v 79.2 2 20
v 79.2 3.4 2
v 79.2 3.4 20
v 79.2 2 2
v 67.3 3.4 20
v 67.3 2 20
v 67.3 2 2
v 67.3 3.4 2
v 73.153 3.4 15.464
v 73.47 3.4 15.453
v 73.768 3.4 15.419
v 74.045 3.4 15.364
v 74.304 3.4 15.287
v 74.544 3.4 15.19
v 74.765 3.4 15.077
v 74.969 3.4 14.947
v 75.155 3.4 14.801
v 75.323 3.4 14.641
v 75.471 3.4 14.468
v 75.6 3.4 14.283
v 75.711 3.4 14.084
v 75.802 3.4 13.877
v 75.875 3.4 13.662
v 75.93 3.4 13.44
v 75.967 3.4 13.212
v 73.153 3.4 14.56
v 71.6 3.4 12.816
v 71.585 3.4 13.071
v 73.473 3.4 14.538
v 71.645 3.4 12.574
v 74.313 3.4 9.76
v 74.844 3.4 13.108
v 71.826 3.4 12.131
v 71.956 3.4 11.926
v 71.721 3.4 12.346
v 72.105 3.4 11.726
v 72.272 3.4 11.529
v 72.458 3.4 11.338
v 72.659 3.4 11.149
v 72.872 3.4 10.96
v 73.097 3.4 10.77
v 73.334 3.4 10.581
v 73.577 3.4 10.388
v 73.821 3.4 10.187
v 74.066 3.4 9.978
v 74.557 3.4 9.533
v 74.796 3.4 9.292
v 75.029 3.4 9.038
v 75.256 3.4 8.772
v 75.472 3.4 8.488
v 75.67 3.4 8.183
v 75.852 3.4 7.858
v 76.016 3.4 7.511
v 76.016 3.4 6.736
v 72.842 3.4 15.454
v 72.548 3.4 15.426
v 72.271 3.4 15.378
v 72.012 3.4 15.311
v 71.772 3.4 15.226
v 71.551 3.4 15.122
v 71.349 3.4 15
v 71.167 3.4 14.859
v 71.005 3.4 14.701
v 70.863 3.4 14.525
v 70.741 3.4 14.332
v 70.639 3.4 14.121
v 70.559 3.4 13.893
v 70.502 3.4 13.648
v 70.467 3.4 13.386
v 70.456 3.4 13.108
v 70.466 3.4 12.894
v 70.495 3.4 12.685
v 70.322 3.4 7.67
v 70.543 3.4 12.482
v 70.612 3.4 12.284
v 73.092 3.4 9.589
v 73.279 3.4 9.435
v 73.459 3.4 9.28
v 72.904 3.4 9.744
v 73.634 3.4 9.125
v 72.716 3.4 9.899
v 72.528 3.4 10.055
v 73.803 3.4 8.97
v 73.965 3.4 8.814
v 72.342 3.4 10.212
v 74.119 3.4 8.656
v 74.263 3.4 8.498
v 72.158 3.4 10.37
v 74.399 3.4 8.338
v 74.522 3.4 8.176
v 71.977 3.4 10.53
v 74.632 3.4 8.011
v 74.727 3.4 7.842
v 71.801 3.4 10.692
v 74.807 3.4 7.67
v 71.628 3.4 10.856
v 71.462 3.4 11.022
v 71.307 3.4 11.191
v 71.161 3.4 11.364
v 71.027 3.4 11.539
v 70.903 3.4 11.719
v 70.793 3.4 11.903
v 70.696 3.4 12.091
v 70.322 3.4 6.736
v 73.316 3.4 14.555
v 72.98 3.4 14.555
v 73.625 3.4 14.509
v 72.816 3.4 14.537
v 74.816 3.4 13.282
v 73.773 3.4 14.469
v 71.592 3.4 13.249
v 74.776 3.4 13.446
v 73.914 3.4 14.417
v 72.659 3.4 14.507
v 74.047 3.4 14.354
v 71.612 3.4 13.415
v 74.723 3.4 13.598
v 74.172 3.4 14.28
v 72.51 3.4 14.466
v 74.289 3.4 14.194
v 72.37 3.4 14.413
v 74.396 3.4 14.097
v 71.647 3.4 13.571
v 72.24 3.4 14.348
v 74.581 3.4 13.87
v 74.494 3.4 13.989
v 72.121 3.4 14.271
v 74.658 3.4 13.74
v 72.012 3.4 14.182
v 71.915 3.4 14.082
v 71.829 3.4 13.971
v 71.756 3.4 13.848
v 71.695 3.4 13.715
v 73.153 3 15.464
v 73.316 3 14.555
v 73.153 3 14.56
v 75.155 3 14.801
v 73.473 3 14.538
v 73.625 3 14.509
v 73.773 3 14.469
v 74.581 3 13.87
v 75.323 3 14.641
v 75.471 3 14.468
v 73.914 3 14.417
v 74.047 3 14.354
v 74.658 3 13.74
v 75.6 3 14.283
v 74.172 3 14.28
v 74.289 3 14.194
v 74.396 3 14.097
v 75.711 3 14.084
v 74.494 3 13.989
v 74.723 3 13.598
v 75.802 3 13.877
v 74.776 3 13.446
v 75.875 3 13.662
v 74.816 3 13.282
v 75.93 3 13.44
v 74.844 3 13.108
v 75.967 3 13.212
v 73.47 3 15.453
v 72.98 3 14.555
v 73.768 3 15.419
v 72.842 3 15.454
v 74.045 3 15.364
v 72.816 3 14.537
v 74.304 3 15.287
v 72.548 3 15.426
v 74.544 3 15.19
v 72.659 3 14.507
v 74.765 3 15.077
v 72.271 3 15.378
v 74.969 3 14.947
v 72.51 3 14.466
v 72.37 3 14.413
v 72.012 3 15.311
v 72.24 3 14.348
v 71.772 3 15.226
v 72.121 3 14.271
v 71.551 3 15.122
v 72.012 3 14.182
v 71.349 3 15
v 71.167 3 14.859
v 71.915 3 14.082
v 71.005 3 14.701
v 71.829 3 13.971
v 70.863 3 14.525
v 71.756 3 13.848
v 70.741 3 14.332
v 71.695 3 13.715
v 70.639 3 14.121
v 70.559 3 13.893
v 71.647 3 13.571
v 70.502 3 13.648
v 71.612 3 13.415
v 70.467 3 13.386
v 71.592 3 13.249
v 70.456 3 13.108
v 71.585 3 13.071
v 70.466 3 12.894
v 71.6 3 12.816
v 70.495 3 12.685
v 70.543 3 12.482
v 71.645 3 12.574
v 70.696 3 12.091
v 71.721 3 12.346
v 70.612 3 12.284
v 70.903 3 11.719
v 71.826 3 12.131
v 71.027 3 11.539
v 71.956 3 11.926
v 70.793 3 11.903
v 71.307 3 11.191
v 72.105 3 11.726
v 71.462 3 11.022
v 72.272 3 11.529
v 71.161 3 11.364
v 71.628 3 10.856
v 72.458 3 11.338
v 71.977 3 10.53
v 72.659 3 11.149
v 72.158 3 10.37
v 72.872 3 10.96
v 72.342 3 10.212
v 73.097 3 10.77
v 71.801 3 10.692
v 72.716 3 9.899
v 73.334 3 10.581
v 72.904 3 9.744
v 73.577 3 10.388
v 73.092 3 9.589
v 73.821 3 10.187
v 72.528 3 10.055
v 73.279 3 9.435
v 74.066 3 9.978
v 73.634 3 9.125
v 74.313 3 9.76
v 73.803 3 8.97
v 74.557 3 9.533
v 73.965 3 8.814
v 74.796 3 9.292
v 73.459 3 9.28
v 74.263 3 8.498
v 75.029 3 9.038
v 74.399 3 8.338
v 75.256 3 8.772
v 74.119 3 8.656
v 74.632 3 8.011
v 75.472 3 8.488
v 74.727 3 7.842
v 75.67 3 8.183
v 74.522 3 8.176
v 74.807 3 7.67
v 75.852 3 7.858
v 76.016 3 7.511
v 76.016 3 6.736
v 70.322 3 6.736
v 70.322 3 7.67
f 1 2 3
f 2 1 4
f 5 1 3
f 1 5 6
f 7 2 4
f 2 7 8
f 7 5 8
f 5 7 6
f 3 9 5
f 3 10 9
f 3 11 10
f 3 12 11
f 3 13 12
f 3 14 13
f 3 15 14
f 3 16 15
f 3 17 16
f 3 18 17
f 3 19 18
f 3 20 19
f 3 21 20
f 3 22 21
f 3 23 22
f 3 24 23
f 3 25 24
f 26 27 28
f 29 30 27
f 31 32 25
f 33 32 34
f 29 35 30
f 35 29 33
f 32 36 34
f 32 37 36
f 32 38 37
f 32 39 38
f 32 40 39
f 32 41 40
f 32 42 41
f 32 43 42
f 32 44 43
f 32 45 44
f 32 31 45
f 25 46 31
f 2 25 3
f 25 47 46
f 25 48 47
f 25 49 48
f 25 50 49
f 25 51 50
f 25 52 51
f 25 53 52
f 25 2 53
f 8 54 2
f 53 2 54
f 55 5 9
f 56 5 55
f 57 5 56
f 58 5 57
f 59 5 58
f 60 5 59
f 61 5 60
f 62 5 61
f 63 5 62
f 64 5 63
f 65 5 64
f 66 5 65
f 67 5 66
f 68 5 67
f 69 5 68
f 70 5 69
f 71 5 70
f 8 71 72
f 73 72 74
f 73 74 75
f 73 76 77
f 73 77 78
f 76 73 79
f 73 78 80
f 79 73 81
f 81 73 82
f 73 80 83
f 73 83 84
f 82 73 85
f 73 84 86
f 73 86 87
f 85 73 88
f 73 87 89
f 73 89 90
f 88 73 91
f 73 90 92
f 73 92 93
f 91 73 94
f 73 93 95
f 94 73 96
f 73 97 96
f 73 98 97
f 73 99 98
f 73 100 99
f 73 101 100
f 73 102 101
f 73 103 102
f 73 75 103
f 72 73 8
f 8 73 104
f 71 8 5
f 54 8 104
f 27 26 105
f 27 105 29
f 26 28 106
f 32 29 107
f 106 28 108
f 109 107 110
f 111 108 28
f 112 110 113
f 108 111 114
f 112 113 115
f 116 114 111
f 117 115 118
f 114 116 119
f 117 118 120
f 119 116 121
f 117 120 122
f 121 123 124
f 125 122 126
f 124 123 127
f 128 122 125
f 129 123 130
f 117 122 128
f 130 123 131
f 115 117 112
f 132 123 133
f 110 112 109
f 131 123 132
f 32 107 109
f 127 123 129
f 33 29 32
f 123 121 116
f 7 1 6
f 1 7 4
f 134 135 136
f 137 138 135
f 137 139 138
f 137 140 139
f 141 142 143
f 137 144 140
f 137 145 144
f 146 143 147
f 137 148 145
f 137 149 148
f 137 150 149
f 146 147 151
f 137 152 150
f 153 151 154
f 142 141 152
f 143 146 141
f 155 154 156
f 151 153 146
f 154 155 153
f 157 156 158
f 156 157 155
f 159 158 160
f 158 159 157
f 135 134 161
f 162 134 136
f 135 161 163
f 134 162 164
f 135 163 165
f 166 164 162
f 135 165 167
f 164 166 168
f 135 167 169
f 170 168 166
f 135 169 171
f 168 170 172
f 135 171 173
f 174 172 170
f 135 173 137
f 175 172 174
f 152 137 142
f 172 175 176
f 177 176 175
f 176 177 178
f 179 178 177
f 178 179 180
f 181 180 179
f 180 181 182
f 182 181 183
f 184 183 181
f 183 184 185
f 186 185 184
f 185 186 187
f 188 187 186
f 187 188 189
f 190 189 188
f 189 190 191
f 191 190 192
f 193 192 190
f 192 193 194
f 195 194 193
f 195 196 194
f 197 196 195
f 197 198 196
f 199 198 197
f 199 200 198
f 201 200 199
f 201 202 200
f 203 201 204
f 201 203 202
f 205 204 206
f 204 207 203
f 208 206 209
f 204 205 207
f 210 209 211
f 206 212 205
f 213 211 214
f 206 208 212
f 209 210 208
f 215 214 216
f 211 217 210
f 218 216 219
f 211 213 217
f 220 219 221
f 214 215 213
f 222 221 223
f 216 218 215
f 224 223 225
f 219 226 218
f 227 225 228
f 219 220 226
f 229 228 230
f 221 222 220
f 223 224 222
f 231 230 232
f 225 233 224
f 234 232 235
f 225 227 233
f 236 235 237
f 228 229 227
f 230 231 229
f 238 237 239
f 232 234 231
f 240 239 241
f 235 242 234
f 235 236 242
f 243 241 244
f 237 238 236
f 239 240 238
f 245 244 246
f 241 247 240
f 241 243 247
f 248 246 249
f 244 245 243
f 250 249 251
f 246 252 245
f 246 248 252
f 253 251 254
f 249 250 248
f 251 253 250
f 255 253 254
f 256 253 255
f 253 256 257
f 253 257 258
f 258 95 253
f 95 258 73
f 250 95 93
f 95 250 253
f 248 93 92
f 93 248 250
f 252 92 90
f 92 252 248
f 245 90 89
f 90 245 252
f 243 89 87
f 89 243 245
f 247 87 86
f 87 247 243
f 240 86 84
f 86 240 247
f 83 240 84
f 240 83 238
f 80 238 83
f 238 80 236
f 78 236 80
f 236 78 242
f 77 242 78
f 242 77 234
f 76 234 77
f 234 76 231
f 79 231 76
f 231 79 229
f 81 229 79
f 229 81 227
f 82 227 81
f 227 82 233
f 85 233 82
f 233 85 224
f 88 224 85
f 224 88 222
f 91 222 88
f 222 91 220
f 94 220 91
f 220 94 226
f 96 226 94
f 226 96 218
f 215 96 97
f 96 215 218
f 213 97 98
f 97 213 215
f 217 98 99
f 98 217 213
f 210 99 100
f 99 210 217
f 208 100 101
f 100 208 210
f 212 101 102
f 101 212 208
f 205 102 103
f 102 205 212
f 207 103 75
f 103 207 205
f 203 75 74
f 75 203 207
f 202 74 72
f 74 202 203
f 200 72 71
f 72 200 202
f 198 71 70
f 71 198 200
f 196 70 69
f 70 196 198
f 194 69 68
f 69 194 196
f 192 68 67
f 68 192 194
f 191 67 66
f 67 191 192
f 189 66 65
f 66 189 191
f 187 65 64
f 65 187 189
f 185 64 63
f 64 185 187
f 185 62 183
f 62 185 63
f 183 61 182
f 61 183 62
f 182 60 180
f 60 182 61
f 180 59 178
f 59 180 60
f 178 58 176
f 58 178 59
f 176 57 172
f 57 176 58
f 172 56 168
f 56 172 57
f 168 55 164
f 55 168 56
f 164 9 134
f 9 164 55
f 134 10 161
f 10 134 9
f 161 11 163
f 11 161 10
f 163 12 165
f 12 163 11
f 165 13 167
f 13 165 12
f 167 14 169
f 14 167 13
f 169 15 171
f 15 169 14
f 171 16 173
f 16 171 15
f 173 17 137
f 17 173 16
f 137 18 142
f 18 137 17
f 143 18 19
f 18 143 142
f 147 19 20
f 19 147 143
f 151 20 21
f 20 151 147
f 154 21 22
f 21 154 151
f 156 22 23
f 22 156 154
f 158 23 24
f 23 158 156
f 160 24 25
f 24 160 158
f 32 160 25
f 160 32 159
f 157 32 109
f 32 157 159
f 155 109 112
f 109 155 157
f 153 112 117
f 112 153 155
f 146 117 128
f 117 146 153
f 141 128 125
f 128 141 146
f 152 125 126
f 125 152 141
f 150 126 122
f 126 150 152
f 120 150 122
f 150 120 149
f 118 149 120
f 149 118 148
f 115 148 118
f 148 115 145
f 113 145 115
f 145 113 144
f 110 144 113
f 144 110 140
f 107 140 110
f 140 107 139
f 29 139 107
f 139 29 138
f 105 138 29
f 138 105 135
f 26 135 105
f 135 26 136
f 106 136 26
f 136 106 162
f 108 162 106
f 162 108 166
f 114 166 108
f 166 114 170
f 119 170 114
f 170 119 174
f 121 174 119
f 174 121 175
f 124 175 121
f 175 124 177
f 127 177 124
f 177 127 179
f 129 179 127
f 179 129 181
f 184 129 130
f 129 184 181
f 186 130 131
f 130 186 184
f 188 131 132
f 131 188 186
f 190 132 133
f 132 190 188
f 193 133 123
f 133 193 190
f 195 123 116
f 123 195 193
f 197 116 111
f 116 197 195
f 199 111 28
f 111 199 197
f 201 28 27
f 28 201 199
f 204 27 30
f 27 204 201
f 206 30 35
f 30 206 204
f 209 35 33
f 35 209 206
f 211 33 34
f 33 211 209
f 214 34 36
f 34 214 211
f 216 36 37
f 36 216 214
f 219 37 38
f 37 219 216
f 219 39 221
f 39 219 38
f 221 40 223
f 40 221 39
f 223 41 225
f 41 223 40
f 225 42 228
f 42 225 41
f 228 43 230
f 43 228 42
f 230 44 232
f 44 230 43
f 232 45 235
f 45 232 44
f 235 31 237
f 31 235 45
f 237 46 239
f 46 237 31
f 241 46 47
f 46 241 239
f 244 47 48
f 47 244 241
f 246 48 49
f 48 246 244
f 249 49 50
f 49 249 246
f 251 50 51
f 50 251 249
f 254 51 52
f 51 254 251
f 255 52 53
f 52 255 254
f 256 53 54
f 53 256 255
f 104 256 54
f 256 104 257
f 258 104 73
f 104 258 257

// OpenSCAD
// file: params.scad
// spellchecker:ignore centreline counterbore datasheet elec usbc waveshare
// --- Display ---
// Waveshare 7.5inch e-Paper V2 (800×480). Datasheet:
// https://www.waveshare.com/w/upload/6/60/7.5inch_e-Paper_V2_Specification.pdf
display_w        = 111.2;  // display panel width  (mm) — portrait
display_h        = 170.2;  // display panel height (mm) — portrait
disp_thickness   =   1.25; // display panel thickness (mm) — datasheet 1.18; 1.25 gives 0.07mm extra shelf clearance
screen_area_w    =  97.92; // active screen width  (mm)
screen_area_h    = 163.2;  // active screen height (mm)
display_border_wide  =  9.78; // wide border (long edge, right side; = display_w − display_border_narrow − screen_area_w)
display_border_narrow=  3.5;  // narrow border (long edge, left/top/bottom = 1.2+1.5+0.8mm from datasheet)
display_border_short =  3.5;  // short-edge border (top and bottom)
disp_shift           =  0.6;  // additional downward Y offset on display; creates 1mm stopper lip on upper L-blocks

// --- Cavities (back shell interior) ---
elec_w         =  65;    // Pi Zero width  (mm)
elec_l         =  30;    // Pi Zero length (mm)
elec_depth     =  16;    // Pi Zero + PiSugar stack depth (mm) — 15.7mm actual
hat_w          =  30;    // Waveshare HAT width  (mm) — rotated 90° in case
hat_l          =  66;    // Waveshare HAT length (mm)
hat_depth      =   9.5;  // Waveshare HAT depth  (mm)
bat_w          =  28;    // battery width  (mm) — portrait: 28×59 footprint
bat_l          =  59;    // battery length (mm)
bat_depth      =  12.5;  // battery depth  (mm) — 10.7 body + 1.8 magnet

// --- Primitives first (no dependencies) ---
case_w         = 135;    // width  (mm) — 135mm clears 4mm nut towers with 1.5mm margin right of display
case_h         = 210;    // height (mm) — 2+170+35+2=209 → 210
front_depth    =   2;    // front bezel thickness (mm)
back_depth     =  20;    // back shell depth (mm) — elec_depth 15.7 + 2 wall + 2.3 clearance; unconfirmed
fillet_r       =   2;    // outer-edge fillet radius (mm)
edge_overhang_angle = 55; // chamfer→fillet transition (deg from horizontal); 45=safe, 55=X1C tuned
tol            = 0.2;    // FDM clearance on each mating face (mm)
wall_t         = 2;      // nominal wall thickness (mm)

// --- PiSugar flex-tab buttons (south wall) ---
btn_hinge_w     = 2;    // hinge strip width (mm) — right short edge, in-layer bending; flexing beam between fixed wall (_hinge_x1) and tab
btn_slot_kerf   = 1.0;  // slot kerf width (mm) — bottom horizontal slot (Z-direction gap), 0.7 will fuse to material below
btn_slot_kerf_top = 0.75; // slot kerf width (mm) — top horizontal slot (Z-direction gap)
btn_slot_kerf_x = 0.5;  // side slot kerf width (mm) — vertical free-side slot (X-direction gap); wider to prevent fusion

// --- Button area (front face, lower section below display) ---
btn_area_h     =  35;    // height of button zone at bottom of front face (mm)
btn_rows       =   2;
btn_cols       =   4;
btn_hole_tolerance = 0.2;
btn_hole_diameter = 10; // button hole diameter (mm) — physical cap sized to fit with tol clearance
btn_fillet_r   =   2;    // fillet radius on button hole outer edge (mm)
btn_zone_w     = case_w / btn_cols;   // each button is centred in its zone
btn_row_y1     = btn_area_h / 2 - 10;  // bottom row y centre
btn_row_y2     = btn_area_h / 2 + 4;  // top row y centre (closer to display)

// --- Carrier switch layout (shared with carrier.scad) ---
_sw            =  6;    // switch body footprint (mm)
_margin_y      =  1;    // Y margin beyond outermost switch edges (mm)
_loc_y1        = _sw / 2 + _margin_y;                   // 4mm  — bottom row centre in carrier coords
_loc_y2        = _loc_y1 + (btn_row_y2 - btn_row_y1);  // 18mm — top row centre in carrier coords

// --- Magnet recesses (back plate inner face) ---
magnet_d            = 15;   // diameter (mm) — derived from PiSugar image; tune after measuring
magnet_recess_depth = 1.5;  // depth into back plate; leaves 0.5mm wall

// --- Mating-face rabbet/tongue joint ---
rabbet_w       = 1;      // rabbet width into inner wall face (mm)
rabbet_d       = 1.5;    // rabbet depth from mating face (mm) — 2mm coincided with HDMI outer top

// --- M2 fasteners ---
screw_boss_id  = 2.1;    // screw shank clearance diameter (mm)
screw_head_d   = 4.0;    // screw head diameter (mm) — M2 button head, +clearance for circular-hole droop
screw_head_h   = wall_t; // screw head height (mm) — counterbore cuts through full wall thickness
screw_depth    = 25;     // total clearance hole depth from exterior (mm)
nut_af         = 4;      // hex nut across-flats (mm)
nut_t          = 1.6;    // hex nut thickness (mm)
tower_h        = 17;     // nut tower height from front plate inner face (mm) — 17mm leaves 1mm above back floor
tower_w        = 15;     // nut tower width in Y (mm)
// Y centres of the two screws per side; symmetric around case_h/2, clear of Pi stack (Y<32)
side_screw_y   = [case_h / 2 - case_h * 0.3, case_h / 2 + case_h * 0.3];

// --- USB-C notch ---
usbc_notch_w   =  12;    // notch width  (mm)
usbc_notch_h   =   4;    // notch height (mm)

// --- Derived positions (all dependencies above) ---
// Y=0 at bottom (USB-C / south face); X=0 at left inner wall
_elec_x  = wall_t + 0.3;              // Pi Zero left edge (0.3mm right of inner wall; SD card tip flush with exterior)
_elec_y  = wall_t;                   // Pi Zero bottom edge (USB-C face)
_bat_x   = _elec_x + elec_w - bat_w; // battery right edge aligned with Pi Zero right edge
_bat_y   = wall_t + elec_l;          // battery bottom edge above Pi Zero
// Display: active area centred; wide border on right long edge
_screen_x = (case_w - screen_area_w) / 2;   // active screen X centre in case
_disp_x   = _screen_x - display_border_narrow; // panel left edge (narrow border on left)
_disp_y   = btn_area_h + (case_h - btn_area_h - display_h) / 2;  // panel vertically centred above buttons
// HAT holder pegs: centred between left and middle display column pads;
// HAT (66mm long edge along X, rotated 90°) holes 57.5mm apart, 4.25mm in from each end
_hat_peg_x = (_disp_x + 10 + 15/2 + _disp_x + (display_w - 15)/2 + 15/2) / 2;
_hat_peg_y = _disp_y - disp_shift + (display_h - 15) / 2 + 15 + 27;
// (boss_inset removed — corner bosses replaced by side-entry screw towers)
// main file
// Insertable Pi-stack lateral lock — wedges into the gap between the Pi
// stack's right PCB edge and carrier support column 1, locking the stack
// against X movement (case width). Inserted vertically from the mating face,
// like pi-stack-divider. Sheet is oversized for trimming to fit print
// tolerances.
include <params.scad>

// spellchecker:ignore deboss elec halign insertable

// X: gap is 12mm (column 1 starts 12mm right of the Pi stack's right edge,
// shifted +2mm off its nominal 10mm position to clear the carrier's wire-channel
// groove — see back.scad). Thickness leaves 0.5*tol clearance to column 1.
_lock_x0 = _elec_x + elec_w;
_lock_w  = 12 - 0.5 * tol;

// Y: from the inner south wall (wall_t) to the carrier-seating cutaway's
// south edge (_cni, back.scad), so the shim sits in the south-retain zone of
// column 1 without colliding with the carrier or the south-wall rabbet.
// _cni = btn_row_y1 - 4 - 0.5*tol (mirrors back.scad's carrier support block).
_lock_y0 = wall_t;
_lock_y1 = btn_row_y1 - 4 - 0.5 * tol;

// Z: full pillar height, as high as the back shell.
_lock_h = back_depth - wall_t;

module pi_stack_lock() {
    difference() {
        translate([_lock_x0, _lock_y0, wall_t])
            cube([_lock_w, _lock_y1 - _lock_y0, _lock_h]);
        // Alignment mark: deboss "2" into the north face (opposite the south
        // face that seats against the wall), same X/Z as back.scad's mark, so
        // the two "2"s line up through the part's thickness when inserted
        // (text X = world X, text Y = world Z)
        translate([_lock_x0 + _lock_w / 2, _lock_y1 + 0.1, (wall_t + back_depth) / 2])
            rotate([90, 0, 0])
                mirror([1, 0, 0])
                    linear_extrude(0.4 + 0.1)
                        text("2", size = 9, halign = "center", valign = "center");
    }
}

pi_stack_lock();
